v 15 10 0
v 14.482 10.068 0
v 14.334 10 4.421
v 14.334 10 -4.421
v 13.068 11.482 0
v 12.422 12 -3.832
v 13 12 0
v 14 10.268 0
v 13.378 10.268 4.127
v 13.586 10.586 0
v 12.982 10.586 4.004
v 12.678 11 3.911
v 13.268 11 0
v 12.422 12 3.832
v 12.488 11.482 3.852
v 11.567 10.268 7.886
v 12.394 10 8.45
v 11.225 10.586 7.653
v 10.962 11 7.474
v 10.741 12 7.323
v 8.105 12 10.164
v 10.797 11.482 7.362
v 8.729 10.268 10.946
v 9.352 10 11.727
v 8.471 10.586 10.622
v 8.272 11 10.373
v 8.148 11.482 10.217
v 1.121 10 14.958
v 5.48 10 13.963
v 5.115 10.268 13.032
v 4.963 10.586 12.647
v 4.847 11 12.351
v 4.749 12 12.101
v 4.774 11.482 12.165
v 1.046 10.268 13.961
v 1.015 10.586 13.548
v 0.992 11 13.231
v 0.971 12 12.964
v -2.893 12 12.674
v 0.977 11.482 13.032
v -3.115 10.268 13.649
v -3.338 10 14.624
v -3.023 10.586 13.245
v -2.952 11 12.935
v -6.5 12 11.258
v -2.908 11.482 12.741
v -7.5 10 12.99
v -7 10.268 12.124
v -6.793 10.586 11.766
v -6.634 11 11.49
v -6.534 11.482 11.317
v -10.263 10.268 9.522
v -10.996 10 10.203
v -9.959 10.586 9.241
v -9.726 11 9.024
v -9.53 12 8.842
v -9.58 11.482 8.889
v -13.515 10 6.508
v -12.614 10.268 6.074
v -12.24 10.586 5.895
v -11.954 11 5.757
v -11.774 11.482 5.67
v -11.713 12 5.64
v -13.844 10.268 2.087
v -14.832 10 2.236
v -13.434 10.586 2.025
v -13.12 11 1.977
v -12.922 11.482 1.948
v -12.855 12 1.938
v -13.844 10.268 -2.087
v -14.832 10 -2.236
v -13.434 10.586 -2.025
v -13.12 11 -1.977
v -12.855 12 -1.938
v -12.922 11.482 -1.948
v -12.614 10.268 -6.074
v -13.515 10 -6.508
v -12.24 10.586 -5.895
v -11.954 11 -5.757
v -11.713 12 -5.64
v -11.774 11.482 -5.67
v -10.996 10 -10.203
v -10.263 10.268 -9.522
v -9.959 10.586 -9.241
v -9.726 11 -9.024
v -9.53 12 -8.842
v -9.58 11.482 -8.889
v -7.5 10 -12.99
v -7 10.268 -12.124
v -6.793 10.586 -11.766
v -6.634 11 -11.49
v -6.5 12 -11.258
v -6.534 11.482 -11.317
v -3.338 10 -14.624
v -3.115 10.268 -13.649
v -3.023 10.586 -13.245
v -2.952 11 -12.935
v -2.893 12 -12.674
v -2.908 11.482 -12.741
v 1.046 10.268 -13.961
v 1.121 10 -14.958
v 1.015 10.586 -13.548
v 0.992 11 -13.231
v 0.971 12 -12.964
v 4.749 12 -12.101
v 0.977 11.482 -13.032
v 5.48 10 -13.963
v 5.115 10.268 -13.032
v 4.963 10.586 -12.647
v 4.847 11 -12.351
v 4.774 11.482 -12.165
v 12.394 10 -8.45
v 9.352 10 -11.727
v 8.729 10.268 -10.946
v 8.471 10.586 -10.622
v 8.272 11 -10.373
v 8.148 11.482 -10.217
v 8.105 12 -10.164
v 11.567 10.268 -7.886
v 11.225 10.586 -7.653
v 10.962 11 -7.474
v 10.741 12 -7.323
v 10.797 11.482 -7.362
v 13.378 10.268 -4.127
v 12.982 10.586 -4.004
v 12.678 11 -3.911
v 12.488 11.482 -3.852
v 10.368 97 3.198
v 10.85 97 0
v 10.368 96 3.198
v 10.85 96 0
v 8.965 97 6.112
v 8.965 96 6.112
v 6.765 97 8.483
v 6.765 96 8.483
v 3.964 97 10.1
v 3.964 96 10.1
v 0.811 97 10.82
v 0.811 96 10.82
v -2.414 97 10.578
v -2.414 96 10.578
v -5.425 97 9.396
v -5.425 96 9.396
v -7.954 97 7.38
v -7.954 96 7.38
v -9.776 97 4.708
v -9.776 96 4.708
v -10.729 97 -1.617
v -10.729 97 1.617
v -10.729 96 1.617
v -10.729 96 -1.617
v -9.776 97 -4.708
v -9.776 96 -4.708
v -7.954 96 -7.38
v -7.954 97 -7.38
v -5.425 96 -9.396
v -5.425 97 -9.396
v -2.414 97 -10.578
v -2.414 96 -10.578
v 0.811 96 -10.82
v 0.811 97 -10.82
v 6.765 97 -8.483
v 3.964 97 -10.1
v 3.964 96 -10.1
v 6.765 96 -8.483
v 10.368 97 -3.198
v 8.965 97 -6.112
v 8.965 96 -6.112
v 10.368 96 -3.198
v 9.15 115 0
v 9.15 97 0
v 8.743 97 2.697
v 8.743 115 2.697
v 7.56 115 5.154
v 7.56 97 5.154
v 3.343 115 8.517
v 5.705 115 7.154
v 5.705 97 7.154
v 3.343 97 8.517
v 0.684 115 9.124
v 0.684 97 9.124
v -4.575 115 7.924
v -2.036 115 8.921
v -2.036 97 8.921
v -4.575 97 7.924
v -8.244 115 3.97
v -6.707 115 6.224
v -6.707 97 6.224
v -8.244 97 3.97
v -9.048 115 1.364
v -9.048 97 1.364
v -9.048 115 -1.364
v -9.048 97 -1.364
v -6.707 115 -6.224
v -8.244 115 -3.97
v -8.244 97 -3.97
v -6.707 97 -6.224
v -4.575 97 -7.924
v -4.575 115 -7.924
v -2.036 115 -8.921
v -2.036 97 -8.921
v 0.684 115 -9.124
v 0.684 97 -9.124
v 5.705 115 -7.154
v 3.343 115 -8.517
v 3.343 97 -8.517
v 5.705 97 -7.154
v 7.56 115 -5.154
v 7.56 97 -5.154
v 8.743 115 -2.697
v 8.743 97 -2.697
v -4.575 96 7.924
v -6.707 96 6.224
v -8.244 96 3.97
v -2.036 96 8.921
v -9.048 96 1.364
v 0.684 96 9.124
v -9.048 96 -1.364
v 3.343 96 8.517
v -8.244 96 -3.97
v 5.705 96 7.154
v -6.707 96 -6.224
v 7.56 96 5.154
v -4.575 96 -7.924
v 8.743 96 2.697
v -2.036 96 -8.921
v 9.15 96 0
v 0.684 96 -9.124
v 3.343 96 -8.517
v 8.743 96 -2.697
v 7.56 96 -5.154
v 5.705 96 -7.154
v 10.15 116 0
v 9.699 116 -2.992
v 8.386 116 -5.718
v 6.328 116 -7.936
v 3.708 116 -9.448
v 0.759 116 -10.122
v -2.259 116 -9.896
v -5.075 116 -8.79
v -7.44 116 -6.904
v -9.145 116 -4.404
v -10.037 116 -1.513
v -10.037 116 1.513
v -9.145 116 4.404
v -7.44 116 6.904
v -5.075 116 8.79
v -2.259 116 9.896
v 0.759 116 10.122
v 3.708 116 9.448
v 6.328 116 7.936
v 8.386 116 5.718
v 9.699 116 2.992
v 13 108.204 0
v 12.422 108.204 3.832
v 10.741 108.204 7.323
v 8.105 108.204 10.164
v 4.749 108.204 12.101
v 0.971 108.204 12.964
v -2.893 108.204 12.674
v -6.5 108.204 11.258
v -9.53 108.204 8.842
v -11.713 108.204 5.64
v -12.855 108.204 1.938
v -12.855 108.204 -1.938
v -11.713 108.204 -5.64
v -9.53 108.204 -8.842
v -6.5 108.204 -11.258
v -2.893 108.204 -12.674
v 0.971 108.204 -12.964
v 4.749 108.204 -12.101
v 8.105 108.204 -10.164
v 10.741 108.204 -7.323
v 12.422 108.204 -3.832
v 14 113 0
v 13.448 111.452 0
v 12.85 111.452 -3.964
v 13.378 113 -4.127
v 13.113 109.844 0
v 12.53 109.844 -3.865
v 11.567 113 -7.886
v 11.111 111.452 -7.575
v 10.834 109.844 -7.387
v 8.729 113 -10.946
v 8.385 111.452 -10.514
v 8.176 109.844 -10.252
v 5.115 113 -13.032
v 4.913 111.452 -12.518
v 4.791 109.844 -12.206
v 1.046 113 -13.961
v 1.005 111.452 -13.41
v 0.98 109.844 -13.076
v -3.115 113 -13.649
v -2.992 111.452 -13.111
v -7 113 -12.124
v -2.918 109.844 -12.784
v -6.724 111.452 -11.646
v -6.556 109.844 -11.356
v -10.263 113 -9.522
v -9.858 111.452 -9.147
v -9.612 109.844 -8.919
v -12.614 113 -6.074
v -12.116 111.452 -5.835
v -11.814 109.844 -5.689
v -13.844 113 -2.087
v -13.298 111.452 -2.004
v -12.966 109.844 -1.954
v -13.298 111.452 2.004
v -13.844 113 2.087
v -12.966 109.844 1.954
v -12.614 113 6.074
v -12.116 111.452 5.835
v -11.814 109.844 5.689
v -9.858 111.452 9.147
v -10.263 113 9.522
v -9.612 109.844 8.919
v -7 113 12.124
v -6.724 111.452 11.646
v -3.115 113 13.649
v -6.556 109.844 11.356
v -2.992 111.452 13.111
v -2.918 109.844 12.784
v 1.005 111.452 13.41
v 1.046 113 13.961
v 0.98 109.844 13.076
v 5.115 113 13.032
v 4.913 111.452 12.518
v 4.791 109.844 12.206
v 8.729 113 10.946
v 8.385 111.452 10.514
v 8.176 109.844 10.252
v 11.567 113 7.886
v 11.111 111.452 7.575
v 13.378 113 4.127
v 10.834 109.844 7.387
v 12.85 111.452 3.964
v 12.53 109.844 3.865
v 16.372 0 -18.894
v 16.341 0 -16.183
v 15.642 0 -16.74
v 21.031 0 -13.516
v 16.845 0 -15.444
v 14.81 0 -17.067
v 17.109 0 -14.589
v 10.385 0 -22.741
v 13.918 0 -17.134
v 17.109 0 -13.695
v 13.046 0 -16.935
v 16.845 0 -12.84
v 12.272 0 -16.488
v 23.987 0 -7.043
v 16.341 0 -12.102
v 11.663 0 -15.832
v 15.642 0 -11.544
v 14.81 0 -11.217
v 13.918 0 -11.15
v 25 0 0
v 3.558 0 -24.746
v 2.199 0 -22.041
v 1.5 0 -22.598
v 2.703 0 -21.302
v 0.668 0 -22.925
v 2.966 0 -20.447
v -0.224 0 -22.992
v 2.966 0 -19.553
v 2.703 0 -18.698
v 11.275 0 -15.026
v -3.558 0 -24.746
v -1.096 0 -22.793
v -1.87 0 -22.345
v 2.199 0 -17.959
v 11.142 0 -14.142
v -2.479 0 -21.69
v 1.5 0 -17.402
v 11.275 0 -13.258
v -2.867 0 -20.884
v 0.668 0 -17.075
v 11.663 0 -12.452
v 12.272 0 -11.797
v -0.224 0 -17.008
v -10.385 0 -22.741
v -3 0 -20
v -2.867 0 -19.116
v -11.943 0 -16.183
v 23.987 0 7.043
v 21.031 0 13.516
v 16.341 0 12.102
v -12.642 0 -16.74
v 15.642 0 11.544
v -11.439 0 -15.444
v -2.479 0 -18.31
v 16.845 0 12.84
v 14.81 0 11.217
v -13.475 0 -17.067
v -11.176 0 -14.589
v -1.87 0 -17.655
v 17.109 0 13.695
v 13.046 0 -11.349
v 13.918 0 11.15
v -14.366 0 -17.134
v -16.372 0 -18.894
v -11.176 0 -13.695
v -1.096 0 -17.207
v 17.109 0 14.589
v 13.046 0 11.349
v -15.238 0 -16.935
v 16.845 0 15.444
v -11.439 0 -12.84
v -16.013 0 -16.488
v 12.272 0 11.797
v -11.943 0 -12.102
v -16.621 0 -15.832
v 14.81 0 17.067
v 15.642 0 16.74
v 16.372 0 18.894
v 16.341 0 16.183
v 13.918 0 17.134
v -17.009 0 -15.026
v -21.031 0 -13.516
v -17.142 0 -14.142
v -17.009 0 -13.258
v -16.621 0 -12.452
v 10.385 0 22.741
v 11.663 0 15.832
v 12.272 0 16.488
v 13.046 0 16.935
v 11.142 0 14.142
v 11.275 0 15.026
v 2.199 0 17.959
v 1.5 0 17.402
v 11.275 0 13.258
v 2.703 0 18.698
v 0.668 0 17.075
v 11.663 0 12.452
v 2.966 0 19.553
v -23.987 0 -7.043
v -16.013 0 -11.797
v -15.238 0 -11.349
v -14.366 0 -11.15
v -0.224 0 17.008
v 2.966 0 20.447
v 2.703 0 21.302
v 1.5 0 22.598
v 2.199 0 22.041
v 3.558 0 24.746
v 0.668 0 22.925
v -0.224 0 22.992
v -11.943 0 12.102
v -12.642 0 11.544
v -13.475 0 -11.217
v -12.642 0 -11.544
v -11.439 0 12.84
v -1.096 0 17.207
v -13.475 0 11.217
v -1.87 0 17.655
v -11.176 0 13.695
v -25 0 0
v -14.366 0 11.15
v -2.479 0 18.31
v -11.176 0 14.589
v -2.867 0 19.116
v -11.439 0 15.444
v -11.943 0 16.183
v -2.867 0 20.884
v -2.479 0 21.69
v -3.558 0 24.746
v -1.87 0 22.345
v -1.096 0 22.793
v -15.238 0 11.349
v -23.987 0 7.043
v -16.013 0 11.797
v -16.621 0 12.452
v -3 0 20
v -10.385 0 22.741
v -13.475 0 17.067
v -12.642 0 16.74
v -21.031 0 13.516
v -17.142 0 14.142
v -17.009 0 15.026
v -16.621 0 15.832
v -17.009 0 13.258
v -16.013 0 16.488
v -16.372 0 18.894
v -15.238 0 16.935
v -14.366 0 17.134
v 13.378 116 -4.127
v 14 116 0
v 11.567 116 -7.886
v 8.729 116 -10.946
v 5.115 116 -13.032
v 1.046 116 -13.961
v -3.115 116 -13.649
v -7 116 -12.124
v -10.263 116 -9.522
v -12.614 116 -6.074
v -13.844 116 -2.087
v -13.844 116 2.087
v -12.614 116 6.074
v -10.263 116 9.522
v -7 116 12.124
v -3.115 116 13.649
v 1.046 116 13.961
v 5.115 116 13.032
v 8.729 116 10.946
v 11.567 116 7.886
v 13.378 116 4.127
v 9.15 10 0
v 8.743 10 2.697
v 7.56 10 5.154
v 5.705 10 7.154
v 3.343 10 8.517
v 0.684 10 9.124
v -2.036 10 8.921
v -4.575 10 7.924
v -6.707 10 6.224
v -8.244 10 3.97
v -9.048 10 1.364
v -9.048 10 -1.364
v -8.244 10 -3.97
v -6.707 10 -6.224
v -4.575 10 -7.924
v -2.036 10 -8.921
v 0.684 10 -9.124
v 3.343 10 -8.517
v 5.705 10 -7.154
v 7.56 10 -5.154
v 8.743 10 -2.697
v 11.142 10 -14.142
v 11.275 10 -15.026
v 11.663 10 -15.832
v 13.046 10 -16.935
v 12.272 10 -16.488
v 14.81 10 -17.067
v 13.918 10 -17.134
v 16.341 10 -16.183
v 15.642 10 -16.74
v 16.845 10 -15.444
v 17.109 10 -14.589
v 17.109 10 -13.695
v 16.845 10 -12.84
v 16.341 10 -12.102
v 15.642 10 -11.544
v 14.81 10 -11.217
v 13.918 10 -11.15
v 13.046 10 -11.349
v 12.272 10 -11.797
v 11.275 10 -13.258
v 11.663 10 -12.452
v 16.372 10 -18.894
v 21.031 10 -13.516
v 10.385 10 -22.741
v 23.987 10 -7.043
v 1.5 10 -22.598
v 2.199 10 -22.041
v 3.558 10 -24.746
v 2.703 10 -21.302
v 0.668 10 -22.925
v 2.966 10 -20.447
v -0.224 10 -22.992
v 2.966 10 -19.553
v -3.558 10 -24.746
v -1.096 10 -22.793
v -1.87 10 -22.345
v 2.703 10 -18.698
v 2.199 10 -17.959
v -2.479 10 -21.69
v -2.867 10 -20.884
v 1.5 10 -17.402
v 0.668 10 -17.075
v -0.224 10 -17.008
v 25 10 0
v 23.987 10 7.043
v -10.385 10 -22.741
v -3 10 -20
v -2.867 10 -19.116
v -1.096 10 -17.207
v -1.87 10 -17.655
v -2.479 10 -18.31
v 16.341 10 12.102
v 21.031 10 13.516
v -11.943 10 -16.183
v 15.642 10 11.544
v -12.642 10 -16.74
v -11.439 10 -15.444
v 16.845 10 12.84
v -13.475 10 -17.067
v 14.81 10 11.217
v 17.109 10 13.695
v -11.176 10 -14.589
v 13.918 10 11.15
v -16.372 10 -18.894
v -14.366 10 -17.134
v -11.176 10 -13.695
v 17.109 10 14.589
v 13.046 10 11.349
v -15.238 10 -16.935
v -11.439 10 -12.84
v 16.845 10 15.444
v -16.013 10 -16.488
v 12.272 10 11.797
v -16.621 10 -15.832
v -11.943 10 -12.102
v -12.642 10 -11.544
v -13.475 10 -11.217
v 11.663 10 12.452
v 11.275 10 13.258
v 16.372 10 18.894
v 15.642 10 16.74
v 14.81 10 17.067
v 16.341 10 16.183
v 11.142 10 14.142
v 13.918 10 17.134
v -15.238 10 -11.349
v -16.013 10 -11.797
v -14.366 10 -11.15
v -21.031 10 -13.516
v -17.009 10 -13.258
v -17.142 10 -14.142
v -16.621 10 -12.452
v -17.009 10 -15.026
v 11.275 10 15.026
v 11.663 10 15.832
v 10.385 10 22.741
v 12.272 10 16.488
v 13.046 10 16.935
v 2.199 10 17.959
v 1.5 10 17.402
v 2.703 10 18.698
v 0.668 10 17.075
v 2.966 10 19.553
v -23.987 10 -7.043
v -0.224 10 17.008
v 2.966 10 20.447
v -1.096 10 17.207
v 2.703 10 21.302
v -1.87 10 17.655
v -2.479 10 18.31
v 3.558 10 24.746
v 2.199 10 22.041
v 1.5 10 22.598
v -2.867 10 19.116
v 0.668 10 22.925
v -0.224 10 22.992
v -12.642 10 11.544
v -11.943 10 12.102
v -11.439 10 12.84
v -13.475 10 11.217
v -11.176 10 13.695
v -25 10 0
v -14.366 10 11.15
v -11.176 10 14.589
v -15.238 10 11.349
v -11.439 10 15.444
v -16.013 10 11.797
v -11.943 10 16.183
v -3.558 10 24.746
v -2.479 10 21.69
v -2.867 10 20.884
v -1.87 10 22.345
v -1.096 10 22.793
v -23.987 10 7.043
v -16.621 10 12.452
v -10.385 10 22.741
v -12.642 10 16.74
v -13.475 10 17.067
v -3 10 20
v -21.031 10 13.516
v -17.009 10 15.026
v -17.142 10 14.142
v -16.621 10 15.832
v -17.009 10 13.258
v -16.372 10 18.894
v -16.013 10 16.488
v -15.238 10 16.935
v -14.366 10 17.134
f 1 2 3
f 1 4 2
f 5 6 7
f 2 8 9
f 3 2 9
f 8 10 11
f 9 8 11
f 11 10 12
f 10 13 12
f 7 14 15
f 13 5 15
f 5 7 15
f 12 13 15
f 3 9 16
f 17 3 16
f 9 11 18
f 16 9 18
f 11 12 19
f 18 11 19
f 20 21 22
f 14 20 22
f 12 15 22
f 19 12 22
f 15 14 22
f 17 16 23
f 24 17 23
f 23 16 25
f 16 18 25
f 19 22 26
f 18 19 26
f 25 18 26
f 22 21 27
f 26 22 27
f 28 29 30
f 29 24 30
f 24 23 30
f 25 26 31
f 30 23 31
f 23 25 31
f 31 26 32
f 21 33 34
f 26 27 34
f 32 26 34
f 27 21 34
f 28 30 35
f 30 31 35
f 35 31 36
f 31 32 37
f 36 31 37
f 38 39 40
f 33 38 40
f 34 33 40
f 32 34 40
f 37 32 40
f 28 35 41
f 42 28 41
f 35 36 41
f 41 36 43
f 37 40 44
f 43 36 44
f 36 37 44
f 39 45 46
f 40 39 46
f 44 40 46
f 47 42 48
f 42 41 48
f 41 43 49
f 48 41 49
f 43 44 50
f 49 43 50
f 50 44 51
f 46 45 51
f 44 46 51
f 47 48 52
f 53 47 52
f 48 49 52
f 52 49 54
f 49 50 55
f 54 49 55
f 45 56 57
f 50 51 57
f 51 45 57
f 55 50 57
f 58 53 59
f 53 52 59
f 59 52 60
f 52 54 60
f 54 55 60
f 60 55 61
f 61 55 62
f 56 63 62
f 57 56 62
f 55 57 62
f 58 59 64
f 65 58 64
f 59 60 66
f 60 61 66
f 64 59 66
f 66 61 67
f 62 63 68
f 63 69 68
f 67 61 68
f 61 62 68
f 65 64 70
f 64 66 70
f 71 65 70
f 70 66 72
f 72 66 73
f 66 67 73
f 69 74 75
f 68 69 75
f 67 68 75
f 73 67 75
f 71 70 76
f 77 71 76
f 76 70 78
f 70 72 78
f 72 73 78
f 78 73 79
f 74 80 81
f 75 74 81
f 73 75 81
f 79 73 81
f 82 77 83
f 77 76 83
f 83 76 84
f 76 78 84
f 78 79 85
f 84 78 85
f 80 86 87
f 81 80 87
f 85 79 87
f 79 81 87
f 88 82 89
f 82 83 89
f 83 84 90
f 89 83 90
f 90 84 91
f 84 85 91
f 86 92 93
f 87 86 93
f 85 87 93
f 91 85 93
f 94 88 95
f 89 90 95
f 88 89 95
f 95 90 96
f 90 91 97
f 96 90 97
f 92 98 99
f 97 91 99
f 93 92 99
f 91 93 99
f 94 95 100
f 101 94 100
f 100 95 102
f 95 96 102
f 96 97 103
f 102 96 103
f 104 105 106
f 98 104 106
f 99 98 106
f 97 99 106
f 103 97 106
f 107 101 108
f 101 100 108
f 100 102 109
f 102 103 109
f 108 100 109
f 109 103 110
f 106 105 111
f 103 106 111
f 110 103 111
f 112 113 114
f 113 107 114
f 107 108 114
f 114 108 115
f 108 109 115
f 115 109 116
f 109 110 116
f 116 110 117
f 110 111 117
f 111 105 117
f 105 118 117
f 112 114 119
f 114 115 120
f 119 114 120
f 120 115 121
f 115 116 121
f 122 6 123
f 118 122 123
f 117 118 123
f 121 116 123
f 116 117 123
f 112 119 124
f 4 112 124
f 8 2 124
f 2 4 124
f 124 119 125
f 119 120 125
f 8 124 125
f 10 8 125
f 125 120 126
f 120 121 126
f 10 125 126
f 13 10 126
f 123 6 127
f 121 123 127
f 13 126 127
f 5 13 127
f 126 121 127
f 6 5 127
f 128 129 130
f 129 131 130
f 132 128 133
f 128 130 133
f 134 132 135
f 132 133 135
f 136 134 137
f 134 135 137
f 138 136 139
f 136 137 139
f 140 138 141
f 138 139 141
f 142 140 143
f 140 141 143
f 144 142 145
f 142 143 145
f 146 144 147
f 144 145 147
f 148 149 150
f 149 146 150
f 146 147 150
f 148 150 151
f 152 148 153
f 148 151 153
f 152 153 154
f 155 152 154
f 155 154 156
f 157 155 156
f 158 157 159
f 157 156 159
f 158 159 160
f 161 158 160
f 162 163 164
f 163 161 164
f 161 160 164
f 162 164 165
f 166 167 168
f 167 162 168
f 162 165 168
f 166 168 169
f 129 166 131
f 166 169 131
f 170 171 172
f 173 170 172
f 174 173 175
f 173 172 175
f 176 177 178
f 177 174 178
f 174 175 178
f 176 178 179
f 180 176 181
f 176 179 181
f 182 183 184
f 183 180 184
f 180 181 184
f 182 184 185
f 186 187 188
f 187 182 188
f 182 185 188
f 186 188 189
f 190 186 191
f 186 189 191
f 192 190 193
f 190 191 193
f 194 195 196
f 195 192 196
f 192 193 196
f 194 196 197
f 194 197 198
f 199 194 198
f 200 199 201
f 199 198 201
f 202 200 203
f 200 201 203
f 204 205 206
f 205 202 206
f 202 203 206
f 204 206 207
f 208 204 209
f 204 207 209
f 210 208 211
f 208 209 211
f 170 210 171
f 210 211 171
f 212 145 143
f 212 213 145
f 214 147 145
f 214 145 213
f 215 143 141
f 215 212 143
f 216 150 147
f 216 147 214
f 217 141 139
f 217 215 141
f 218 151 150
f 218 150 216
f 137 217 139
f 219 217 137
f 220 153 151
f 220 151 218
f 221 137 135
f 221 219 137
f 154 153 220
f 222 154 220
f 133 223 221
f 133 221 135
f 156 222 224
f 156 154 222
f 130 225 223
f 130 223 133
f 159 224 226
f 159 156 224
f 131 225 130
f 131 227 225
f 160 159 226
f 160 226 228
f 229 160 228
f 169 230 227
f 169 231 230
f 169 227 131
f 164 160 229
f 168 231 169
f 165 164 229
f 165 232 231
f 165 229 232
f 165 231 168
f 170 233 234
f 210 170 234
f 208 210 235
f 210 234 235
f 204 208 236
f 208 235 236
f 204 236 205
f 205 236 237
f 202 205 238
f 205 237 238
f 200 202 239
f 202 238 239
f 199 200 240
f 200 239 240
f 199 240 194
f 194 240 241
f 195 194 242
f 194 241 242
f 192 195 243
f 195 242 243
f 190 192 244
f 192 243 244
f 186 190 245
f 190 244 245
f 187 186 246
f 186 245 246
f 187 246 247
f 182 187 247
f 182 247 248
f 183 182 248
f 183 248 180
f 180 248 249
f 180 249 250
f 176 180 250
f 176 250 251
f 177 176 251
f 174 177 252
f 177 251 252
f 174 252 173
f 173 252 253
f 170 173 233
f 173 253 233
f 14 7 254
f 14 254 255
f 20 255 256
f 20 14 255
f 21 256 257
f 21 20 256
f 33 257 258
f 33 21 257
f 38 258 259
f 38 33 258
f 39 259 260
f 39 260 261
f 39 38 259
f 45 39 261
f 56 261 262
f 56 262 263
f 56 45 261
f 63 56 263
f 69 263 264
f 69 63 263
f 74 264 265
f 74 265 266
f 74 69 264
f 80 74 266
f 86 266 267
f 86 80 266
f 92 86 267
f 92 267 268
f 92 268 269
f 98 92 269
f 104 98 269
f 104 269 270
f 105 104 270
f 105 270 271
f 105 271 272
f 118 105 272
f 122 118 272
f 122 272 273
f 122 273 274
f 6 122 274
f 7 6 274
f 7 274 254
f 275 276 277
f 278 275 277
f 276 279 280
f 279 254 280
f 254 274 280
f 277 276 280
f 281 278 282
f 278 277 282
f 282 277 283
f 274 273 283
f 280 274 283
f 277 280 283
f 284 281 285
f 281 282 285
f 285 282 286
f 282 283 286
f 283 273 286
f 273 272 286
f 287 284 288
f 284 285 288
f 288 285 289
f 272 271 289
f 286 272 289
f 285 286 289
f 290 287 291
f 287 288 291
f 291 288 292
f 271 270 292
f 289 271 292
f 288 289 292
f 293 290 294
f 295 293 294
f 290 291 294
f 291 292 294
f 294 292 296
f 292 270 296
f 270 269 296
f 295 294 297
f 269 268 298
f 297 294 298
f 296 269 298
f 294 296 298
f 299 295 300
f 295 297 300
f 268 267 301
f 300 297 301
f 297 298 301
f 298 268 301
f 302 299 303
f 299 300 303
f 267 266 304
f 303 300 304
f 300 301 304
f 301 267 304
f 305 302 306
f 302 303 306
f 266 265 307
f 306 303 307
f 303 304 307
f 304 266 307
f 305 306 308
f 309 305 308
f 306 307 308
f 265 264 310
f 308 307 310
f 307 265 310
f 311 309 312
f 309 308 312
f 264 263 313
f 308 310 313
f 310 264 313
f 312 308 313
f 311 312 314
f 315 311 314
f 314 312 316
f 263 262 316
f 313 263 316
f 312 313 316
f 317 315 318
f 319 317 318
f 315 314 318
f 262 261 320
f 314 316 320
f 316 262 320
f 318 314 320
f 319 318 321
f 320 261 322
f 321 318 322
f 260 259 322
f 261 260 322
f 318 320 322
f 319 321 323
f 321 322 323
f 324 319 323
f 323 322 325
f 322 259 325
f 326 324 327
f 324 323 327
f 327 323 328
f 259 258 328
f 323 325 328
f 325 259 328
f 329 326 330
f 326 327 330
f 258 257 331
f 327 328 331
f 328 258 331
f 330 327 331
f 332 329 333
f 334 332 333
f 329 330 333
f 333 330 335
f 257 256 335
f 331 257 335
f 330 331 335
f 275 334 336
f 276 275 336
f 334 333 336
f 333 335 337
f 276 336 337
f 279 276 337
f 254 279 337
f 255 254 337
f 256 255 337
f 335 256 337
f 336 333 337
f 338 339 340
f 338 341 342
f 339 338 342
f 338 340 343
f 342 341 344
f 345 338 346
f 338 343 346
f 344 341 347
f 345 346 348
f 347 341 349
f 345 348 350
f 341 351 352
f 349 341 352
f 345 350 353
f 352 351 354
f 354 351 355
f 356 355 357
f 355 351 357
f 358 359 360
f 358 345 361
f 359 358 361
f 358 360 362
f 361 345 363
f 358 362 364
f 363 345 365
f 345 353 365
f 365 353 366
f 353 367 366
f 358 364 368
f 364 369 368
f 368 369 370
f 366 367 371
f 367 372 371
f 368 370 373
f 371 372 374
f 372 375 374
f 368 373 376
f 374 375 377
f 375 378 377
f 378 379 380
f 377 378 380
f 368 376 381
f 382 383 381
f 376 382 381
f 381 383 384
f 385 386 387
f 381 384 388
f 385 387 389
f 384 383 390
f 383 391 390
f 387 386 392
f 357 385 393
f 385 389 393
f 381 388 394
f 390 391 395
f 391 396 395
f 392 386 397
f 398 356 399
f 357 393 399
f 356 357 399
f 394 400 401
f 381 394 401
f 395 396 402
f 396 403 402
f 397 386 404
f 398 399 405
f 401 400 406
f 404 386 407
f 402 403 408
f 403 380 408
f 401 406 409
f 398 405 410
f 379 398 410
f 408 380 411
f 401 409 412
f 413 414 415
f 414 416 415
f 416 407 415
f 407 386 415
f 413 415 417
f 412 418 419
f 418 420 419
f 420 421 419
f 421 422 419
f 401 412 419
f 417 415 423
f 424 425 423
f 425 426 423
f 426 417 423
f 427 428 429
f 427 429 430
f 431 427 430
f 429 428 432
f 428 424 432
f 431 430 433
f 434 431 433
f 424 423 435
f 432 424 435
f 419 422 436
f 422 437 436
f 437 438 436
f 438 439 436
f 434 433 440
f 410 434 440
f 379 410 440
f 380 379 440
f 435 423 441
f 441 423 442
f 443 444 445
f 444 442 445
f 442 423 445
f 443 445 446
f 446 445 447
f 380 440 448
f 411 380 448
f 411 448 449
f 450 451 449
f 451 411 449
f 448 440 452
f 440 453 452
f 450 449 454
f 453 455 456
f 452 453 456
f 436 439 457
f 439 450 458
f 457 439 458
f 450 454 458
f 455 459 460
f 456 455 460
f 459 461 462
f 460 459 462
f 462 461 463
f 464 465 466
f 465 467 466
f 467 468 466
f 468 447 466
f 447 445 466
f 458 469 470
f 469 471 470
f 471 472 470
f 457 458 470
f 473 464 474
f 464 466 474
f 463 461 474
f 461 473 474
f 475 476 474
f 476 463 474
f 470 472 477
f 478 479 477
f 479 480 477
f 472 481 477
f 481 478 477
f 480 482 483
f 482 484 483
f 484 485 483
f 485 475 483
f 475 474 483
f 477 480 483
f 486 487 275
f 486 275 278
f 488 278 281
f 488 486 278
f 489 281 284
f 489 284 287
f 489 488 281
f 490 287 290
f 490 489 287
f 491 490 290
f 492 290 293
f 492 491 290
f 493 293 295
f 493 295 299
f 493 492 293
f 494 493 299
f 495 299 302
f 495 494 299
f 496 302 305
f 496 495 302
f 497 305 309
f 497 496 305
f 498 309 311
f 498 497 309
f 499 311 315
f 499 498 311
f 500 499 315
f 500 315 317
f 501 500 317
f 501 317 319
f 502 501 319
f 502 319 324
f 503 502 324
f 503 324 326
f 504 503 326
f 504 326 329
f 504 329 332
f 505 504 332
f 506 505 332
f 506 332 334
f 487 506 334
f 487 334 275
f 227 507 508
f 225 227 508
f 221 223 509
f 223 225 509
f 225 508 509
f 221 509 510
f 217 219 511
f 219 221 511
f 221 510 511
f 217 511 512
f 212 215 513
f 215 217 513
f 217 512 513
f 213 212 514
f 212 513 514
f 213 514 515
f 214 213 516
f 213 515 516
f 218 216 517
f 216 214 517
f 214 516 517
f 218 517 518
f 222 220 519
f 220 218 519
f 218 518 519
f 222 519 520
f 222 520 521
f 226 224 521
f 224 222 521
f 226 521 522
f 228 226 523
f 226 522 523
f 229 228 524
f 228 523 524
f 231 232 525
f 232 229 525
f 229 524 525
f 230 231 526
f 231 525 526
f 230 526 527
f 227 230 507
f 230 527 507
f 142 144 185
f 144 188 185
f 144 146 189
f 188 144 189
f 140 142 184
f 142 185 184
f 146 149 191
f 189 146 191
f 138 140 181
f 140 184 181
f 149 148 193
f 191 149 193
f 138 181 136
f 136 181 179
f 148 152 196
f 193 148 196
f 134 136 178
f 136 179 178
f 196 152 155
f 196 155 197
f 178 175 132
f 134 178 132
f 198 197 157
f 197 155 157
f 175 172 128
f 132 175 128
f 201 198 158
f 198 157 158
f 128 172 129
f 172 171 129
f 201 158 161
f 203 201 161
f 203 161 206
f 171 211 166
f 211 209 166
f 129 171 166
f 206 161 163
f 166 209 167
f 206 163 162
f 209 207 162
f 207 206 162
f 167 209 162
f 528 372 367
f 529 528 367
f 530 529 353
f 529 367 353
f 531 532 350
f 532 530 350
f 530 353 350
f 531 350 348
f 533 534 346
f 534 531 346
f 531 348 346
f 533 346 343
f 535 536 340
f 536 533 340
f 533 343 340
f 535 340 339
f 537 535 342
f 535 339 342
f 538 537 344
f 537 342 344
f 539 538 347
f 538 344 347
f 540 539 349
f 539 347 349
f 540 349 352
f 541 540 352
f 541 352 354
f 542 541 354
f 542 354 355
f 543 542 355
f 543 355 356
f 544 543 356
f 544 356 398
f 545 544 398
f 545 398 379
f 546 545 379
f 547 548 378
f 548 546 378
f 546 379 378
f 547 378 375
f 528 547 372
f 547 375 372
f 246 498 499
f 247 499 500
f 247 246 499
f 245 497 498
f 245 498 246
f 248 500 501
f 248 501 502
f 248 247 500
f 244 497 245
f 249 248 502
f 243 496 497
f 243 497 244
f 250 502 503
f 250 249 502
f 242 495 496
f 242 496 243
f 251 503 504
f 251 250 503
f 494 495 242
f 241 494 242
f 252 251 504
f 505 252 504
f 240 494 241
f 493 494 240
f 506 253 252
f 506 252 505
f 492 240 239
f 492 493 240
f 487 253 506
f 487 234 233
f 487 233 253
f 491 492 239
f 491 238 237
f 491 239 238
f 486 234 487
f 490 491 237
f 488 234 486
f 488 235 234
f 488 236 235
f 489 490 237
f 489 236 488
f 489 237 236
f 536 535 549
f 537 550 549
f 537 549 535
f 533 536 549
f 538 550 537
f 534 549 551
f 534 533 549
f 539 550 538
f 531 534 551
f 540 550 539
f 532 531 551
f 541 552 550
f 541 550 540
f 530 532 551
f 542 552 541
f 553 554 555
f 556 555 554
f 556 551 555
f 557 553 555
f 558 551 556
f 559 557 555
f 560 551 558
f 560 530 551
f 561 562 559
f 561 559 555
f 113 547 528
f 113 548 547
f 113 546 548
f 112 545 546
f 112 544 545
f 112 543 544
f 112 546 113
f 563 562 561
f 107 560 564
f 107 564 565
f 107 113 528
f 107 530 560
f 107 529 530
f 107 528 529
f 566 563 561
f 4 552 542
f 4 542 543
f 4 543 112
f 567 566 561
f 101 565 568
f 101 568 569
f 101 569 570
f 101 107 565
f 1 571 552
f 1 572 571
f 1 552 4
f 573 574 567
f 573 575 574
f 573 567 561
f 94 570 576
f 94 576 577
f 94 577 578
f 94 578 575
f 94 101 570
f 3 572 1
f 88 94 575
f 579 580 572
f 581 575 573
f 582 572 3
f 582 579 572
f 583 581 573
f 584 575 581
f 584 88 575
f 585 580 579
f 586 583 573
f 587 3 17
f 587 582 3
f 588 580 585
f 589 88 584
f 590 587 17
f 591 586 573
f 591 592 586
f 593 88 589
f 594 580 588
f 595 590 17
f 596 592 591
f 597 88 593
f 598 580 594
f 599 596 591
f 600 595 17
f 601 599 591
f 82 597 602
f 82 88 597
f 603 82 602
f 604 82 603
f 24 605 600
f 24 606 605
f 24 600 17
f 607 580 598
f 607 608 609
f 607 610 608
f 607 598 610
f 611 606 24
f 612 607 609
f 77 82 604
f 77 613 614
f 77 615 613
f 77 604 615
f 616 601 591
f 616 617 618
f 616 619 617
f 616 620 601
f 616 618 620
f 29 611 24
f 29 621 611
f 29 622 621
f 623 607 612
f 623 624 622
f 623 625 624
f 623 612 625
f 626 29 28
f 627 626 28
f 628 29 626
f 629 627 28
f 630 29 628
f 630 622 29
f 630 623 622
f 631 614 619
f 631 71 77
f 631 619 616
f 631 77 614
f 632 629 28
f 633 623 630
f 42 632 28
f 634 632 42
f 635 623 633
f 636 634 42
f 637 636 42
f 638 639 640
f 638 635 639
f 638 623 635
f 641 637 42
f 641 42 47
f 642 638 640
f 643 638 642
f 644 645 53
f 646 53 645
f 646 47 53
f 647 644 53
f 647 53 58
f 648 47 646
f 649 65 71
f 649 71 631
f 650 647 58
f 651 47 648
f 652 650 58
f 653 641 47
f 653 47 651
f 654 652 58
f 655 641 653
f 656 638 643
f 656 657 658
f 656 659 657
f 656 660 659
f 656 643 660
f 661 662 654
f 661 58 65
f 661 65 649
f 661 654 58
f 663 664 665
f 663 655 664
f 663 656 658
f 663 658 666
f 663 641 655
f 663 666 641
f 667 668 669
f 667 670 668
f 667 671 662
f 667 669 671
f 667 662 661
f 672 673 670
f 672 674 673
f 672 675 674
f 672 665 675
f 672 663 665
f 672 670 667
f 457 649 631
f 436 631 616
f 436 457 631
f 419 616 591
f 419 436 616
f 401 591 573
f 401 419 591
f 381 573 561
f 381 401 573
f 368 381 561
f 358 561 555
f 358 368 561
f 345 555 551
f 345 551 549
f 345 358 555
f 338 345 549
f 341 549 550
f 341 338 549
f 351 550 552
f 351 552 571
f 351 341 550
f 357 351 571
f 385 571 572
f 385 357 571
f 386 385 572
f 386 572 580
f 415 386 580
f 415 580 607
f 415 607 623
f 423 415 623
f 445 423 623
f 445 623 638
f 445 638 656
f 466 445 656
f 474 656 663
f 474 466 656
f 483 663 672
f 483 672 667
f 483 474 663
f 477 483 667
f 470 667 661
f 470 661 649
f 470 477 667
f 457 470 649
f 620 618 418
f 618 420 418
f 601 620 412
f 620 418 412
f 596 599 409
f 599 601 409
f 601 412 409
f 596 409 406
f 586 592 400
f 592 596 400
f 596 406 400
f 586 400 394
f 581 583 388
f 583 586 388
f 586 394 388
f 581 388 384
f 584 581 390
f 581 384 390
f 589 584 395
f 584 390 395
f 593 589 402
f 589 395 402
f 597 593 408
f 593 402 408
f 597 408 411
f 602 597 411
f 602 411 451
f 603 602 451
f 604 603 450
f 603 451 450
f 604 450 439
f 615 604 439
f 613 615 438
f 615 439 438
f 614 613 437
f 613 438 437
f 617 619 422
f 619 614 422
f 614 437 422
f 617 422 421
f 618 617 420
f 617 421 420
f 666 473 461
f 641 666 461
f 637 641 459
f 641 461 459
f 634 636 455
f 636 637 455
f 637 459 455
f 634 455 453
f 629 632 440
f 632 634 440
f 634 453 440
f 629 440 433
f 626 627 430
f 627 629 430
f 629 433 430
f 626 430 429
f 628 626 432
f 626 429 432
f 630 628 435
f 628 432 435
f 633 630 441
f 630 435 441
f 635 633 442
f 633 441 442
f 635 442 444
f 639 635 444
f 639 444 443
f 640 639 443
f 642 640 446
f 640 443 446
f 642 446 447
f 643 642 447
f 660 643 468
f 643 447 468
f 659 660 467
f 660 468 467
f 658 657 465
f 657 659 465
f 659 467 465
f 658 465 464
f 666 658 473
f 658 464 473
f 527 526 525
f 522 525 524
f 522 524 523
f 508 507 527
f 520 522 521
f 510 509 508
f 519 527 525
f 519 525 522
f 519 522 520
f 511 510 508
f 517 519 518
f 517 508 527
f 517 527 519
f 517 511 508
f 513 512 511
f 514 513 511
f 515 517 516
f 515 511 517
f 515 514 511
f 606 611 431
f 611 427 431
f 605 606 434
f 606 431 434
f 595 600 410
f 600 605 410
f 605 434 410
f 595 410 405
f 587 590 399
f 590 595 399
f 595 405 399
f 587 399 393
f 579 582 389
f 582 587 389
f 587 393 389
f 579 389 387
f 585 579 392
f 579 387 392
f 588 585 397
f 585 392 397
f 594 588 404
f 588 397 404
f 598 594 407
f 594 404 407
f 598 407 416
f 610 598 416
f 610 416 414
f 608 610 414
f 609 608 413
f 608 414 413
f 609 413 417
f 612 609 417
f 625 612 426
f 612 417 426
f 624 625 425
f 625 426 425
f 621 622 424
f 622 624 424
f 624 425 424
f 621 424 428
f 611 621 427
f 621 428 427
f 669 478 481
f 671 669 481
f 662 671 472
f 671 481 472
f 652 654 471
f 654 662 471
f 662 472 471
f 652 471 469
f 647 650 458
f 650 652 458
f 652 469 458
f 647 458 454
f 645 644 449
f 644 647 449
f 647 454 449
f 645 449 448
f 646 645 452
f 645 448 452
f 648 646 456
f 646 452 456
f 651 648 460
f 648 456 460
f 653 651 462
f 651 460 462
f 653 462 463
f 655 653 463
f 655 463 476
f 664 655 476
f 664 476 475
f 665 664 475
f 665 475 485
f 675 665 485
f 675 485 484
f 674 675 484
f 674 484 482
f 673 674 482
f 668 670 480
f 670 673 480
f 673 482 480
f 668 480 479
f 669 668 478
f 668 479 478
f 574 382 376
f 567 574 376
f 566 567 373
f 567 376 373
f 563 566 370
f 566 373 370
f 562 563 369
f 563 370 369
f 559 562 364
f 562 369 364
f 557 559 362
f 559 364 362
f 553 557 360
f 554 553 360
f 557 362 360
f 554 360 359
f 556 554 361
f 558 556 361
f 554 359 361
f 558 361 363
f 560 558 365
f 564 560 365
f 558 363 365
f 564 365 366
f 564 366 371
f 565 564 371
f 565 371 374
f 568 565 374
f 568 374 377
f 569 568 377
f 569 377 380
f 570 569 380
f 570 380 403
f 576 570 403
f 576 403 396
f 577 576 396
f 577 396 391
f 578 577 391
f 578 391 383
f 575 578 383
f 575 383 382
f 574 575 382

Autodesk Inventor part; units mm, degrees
ref_plane "YZ Plane" through (0, 0, 0) normal (1, 0, 0) x (0, 1, 0)
ref_plane "XZ Plane" through (0, 0, 0) normal (0, 1, 0) x (-1, 0, 0)
ref_plane "XY Plane" through (0, 0, 0) normal (0, 0, 1) x (1, 0, 0)
sketch "Boceto1" plane through (0, 0, 0) normal (0, 1, 0) x (-1, 0, 0)
  circle A0 centre (0, 0) radius 25
  circle A1 centre (0, -20) radius 3
  circle A2 centre (-14.1421, -14.1421) radius 3
  circle A3 centre (14.1421, -14.1421) radius 3
  circle A4 centre (0, 20) radius 3
  circle A5 centre (-14.1421, 14.1421) radius 3
  circle A6 centre (14.1421, 14.1421) radius 3
  line L0 (0, -23) -> (0, -28.5119)
  dimension "d2" = 6
  dimension "d0" = 50
  dimension "d4" = 6
  dimension "d6" = 6
extrude "Extrusión1" add sketch "Boceto1" along normal blind 10
sketch "Boceto2" plane through (0, 10, 0) normal (0, 1, 0) x (1, 0, 0)
  circle A0 centre (0, 0) radius 9.15
  circle A1 centre (0, 0) radius 13
  dimension "d9" = 18.3
  dimension "d10" = 26
extrude "Extrusión2" add sketch "Boceto2" along normal blind 106
fillet "Empalme1" radius 2 1 edges at (-13, 10, 0)
chamfer "Chaflán1" distance 1 angle 45 1 edges at (-9.15, 116, 0)
sketch "Boceto4" plane through (0, 116, 0) normal (0, 1, 0) x (1, 0, 0)
  circle A0 centre (0, 0) radius 11
  circle A1 centre (0, 0) radius 14
  dimension "d22" = 28
extrude "Extrusión4" add sketch "Boceto4" against normal blind 3
fillet "Empalme3" radius 12 1 edges at (-13, 113, 0)
thread "Thread1" size "M6x1" class "6H" standard "ANSI Metric M Profile" full length
thread "Thread2" size "M6x1" class "6H" standard "ANSI Metric M Profile" full length
thread "Thread3" size "M6x1" class "6H" standard "ANSI Metric M Profile" full length
thread "Thread4" size "M6x1" class "6H" standard "ANSI Metric M Profile" full length
thread "Thread5" size "M6x1" class "6H" standard "ANSI Metric M Profile" full length
thread "Thread6" size "M6x1" class "6H" standard "ANSI Metric M Profile" full length
chamfer "Chamfer2" [suppressed]
ref_plane "Work Plane1" through (0, 96, 0) normal (0, 1, 0) x (1, 0, 0)
sketch "Sketch5" plane through (0, 96, 0) normal (0, 1, 0) x (1, 0, 0)
  circle A0 centre (0, 0) radius 13 projected
  circle A1 centre (0, 0) radius 13 projected
  circle A2 centre (0, 0) radius 9.15 projected
  circle A3 centre (0, 0) radius 9.15 projected
  circle A4 centre (0, 0) radius 9.15 projected
  circle A5 centre (0, 0) radius 9.15 projected
  circle A6 centre (0, 0) radius 10.85
  dimension "d43" = 1.7
extrude "Extrusion5" cut sketch "Sketch5" along normal blind 1 contours A6
thread "Thread7" size "M20x2.5" class "6H" standard "ANSI Metric M Profile" full length
properties part number "herramienta2"
